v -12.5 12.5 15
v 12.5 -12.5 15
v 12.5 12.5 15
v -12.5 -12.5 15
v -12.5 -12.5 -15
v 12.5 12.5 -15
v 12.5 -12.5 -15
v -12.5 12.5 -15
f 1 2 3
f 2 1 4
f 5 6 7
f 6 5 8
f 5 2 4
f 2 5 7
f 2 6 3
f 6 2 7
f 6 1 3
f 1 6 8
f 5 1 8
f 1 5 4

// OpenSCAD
// Generated by generate_scads.py
cube(size=[25,25,30], center=true);
